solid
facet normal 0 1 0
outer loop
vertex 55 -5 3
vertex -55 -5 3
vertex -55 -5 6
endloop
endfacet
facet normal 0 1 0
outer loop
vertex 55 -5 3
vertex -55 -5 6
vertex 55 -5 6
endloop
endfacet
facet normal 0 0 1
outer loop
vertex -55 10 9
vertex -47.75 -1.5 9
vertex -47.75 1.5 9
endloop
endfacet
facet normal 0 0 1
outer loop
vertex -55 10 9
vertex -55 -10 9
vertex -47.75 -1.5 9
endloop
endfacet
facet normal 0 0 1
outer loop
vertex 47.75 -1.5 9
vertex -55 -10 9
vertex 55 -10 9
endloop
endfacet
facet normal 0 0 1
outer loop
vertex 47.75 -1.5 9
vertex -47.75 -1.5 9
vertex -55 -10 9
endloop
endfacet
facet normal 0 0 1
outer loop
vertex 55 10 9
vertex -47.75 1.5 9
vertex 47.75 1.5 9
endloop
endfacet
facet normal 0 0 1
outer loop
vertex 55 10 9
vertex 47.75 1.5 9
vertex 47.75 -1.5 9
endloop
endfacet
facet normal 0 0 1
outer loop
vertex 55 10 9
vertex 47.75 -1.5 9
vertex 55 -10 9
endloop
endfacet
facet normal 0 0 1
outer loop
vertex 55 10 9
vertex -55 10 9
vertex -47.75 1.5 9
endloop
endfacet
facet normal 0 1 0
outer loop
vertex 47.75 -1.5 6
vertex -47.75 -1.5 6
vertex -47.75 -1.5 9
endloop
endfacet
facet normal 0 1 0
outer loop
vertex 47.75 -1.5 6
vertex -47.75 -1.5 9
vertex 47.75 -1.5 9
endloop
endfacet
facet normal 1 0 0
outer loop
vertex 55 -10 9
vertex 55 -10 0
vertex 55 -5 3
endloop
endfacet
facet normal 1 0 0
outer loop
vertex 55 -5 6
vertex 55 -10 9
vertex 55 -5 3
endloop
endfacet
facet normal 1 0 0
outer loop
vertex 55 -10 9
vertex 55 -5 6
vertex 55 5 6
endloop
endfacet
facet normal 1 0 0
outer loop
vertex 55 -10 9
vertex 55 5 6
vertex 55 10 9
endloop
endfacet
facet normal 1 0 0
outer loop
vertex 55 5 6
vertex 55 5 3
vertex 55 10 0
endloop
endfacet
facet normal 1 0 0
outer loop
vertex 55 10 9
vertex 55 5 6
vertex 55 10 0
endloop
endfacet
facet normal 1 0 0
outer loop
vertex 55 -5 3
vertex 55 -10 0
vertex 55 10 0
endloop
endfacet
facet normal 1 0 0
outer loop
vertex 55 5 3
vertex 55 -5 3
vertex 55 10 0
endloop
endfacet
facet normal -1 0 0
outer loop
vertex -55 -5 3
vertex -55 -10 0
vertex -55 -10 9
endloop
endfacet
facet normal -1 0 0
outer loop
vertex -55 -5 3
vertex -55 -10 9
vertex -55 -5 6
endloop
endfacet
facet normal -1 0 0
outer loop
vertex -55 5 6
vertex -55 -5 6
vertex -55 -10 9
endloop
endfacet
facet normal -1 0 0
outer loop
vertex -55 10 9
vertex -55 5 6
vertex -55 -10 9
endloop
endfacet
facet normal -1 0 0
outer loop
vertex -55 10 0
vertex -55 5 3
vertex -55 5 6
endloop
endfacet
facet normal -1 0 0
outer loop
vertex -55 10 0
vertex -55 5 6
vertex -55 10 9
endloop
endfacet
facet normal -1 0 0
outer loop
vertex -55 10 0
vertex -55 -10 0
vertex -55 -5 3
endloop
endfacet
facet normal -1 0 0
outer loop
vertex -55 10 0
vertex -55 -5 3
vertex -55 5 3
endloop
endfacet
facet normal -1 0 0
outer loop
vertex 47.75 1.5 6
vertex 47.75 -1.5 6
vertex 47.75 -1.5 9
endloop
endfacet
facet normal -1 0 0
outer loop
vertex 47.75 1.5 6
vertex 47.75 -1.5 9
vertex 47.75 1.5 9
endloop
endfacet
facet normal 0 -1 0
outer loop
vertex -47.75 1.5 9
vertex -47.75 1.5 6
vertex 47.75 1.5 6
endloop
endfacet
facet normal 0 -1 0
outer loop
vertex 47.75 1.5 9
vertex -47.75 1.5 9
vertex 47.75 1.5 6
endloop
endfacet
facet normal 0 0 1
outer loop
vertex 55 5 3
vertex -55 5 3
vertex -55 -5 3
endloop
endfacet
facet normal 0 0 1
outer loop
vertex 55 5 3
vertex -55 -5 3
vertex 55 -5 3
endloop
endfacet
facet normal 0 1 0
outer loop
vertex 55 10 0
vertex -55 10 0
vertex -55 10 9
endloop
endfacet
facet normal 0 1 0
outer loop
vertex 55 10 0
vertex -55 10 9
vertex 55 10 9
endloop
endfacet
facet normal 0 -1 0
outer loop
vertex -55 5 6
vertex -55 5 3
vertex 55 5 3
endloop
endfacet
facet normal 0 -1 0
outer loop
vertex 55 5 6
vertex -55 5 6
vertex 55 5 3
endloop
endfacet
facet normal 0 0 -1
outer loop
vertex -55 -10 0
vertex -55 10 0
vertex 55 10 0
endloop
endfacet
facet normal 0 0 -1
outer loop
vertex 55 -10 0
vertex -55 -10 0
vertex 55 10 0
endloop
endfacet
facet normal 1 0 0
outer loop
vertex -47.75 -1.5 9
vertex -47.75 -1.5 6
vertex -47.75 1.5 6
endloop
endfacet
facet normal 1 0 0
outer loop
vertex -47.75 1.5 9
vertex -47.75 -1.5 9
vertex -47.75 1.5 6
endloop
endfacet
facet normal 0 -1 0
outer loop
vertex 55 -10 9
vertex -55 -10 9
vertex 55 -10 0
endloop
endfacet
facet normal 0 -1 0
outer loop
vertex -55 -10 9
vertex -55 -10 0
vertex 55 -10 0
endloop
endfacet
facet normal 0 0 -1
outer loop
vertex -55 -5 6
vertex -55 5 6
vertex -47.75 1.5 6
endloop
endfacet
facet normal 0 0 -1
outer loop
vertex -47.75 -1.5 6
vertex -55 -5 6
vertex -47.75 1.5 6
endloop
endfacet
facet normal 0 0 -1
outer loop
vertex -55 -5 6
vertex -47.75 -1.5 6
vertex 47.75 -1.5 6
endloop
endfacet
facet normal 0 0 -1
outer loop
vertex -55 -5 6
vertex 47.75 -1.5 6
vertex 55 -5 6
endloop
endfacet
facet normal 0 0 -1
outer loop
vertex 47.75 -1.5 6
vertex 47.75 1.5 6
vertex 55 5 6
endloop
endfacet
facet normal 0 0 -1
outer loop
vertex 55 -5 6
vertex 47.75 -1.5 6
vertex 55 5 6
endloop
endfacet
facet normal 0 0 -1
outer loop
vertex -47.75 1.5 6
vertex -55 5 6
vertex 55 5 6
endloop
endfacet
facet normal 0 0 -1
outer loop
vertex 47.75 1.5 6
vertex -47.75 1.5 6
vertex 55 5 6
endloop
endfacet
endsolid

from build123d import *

# Parameters (mm, degrees)
SKETCH_W      = 110
SKETCH_H      = 20
PAD_DEPTH     = 3
SKETCH001_W   = 110
SKETCH001_H   = 5
PAD001_DEPTH  = 3
SKETCH002_W   = 110
SKETCH002_H   = 20
SKETCH002_W_2 = 95.5
SKETCH002_H_2 = 3
PAD002_DEPTH  = 3


with BuildPart() as part:
    # Sketch → Pad (new body)
    with BuildSketch(Plane.XY):
        Rectangle(SKETCH_W, SKETCH_H)
    extrude(amount=PAD_DEPTH)

    # Sketch001 (on Face6 of Pad) → Pad001 (join)
    with BuildSketch(Plane.XY.offset(3)):
        with Locations((0, 7.5)):
            Rectangle(SKETCH001_W, SKETCH001_H)
        with Locations((0, -7.5)):
            Rectangle(SKETCH001_W, SKETCH001_H)
    extrude(amount=PAD001_DEPTH)

    # Sketch002 (on Face12 of Pad001) → Pad002 (join)
    with BuildSketch(Plane.XY.offset(6)):
        Rectangle(SKETCH002_W, SKETCH002_H)
        Rectangle(SKETCH002_W_2, SKETCH002_H_2, mode=Mode.SUBTRACT)
    extrude(amount=PAD002_DEPTH)


solid = part.part
